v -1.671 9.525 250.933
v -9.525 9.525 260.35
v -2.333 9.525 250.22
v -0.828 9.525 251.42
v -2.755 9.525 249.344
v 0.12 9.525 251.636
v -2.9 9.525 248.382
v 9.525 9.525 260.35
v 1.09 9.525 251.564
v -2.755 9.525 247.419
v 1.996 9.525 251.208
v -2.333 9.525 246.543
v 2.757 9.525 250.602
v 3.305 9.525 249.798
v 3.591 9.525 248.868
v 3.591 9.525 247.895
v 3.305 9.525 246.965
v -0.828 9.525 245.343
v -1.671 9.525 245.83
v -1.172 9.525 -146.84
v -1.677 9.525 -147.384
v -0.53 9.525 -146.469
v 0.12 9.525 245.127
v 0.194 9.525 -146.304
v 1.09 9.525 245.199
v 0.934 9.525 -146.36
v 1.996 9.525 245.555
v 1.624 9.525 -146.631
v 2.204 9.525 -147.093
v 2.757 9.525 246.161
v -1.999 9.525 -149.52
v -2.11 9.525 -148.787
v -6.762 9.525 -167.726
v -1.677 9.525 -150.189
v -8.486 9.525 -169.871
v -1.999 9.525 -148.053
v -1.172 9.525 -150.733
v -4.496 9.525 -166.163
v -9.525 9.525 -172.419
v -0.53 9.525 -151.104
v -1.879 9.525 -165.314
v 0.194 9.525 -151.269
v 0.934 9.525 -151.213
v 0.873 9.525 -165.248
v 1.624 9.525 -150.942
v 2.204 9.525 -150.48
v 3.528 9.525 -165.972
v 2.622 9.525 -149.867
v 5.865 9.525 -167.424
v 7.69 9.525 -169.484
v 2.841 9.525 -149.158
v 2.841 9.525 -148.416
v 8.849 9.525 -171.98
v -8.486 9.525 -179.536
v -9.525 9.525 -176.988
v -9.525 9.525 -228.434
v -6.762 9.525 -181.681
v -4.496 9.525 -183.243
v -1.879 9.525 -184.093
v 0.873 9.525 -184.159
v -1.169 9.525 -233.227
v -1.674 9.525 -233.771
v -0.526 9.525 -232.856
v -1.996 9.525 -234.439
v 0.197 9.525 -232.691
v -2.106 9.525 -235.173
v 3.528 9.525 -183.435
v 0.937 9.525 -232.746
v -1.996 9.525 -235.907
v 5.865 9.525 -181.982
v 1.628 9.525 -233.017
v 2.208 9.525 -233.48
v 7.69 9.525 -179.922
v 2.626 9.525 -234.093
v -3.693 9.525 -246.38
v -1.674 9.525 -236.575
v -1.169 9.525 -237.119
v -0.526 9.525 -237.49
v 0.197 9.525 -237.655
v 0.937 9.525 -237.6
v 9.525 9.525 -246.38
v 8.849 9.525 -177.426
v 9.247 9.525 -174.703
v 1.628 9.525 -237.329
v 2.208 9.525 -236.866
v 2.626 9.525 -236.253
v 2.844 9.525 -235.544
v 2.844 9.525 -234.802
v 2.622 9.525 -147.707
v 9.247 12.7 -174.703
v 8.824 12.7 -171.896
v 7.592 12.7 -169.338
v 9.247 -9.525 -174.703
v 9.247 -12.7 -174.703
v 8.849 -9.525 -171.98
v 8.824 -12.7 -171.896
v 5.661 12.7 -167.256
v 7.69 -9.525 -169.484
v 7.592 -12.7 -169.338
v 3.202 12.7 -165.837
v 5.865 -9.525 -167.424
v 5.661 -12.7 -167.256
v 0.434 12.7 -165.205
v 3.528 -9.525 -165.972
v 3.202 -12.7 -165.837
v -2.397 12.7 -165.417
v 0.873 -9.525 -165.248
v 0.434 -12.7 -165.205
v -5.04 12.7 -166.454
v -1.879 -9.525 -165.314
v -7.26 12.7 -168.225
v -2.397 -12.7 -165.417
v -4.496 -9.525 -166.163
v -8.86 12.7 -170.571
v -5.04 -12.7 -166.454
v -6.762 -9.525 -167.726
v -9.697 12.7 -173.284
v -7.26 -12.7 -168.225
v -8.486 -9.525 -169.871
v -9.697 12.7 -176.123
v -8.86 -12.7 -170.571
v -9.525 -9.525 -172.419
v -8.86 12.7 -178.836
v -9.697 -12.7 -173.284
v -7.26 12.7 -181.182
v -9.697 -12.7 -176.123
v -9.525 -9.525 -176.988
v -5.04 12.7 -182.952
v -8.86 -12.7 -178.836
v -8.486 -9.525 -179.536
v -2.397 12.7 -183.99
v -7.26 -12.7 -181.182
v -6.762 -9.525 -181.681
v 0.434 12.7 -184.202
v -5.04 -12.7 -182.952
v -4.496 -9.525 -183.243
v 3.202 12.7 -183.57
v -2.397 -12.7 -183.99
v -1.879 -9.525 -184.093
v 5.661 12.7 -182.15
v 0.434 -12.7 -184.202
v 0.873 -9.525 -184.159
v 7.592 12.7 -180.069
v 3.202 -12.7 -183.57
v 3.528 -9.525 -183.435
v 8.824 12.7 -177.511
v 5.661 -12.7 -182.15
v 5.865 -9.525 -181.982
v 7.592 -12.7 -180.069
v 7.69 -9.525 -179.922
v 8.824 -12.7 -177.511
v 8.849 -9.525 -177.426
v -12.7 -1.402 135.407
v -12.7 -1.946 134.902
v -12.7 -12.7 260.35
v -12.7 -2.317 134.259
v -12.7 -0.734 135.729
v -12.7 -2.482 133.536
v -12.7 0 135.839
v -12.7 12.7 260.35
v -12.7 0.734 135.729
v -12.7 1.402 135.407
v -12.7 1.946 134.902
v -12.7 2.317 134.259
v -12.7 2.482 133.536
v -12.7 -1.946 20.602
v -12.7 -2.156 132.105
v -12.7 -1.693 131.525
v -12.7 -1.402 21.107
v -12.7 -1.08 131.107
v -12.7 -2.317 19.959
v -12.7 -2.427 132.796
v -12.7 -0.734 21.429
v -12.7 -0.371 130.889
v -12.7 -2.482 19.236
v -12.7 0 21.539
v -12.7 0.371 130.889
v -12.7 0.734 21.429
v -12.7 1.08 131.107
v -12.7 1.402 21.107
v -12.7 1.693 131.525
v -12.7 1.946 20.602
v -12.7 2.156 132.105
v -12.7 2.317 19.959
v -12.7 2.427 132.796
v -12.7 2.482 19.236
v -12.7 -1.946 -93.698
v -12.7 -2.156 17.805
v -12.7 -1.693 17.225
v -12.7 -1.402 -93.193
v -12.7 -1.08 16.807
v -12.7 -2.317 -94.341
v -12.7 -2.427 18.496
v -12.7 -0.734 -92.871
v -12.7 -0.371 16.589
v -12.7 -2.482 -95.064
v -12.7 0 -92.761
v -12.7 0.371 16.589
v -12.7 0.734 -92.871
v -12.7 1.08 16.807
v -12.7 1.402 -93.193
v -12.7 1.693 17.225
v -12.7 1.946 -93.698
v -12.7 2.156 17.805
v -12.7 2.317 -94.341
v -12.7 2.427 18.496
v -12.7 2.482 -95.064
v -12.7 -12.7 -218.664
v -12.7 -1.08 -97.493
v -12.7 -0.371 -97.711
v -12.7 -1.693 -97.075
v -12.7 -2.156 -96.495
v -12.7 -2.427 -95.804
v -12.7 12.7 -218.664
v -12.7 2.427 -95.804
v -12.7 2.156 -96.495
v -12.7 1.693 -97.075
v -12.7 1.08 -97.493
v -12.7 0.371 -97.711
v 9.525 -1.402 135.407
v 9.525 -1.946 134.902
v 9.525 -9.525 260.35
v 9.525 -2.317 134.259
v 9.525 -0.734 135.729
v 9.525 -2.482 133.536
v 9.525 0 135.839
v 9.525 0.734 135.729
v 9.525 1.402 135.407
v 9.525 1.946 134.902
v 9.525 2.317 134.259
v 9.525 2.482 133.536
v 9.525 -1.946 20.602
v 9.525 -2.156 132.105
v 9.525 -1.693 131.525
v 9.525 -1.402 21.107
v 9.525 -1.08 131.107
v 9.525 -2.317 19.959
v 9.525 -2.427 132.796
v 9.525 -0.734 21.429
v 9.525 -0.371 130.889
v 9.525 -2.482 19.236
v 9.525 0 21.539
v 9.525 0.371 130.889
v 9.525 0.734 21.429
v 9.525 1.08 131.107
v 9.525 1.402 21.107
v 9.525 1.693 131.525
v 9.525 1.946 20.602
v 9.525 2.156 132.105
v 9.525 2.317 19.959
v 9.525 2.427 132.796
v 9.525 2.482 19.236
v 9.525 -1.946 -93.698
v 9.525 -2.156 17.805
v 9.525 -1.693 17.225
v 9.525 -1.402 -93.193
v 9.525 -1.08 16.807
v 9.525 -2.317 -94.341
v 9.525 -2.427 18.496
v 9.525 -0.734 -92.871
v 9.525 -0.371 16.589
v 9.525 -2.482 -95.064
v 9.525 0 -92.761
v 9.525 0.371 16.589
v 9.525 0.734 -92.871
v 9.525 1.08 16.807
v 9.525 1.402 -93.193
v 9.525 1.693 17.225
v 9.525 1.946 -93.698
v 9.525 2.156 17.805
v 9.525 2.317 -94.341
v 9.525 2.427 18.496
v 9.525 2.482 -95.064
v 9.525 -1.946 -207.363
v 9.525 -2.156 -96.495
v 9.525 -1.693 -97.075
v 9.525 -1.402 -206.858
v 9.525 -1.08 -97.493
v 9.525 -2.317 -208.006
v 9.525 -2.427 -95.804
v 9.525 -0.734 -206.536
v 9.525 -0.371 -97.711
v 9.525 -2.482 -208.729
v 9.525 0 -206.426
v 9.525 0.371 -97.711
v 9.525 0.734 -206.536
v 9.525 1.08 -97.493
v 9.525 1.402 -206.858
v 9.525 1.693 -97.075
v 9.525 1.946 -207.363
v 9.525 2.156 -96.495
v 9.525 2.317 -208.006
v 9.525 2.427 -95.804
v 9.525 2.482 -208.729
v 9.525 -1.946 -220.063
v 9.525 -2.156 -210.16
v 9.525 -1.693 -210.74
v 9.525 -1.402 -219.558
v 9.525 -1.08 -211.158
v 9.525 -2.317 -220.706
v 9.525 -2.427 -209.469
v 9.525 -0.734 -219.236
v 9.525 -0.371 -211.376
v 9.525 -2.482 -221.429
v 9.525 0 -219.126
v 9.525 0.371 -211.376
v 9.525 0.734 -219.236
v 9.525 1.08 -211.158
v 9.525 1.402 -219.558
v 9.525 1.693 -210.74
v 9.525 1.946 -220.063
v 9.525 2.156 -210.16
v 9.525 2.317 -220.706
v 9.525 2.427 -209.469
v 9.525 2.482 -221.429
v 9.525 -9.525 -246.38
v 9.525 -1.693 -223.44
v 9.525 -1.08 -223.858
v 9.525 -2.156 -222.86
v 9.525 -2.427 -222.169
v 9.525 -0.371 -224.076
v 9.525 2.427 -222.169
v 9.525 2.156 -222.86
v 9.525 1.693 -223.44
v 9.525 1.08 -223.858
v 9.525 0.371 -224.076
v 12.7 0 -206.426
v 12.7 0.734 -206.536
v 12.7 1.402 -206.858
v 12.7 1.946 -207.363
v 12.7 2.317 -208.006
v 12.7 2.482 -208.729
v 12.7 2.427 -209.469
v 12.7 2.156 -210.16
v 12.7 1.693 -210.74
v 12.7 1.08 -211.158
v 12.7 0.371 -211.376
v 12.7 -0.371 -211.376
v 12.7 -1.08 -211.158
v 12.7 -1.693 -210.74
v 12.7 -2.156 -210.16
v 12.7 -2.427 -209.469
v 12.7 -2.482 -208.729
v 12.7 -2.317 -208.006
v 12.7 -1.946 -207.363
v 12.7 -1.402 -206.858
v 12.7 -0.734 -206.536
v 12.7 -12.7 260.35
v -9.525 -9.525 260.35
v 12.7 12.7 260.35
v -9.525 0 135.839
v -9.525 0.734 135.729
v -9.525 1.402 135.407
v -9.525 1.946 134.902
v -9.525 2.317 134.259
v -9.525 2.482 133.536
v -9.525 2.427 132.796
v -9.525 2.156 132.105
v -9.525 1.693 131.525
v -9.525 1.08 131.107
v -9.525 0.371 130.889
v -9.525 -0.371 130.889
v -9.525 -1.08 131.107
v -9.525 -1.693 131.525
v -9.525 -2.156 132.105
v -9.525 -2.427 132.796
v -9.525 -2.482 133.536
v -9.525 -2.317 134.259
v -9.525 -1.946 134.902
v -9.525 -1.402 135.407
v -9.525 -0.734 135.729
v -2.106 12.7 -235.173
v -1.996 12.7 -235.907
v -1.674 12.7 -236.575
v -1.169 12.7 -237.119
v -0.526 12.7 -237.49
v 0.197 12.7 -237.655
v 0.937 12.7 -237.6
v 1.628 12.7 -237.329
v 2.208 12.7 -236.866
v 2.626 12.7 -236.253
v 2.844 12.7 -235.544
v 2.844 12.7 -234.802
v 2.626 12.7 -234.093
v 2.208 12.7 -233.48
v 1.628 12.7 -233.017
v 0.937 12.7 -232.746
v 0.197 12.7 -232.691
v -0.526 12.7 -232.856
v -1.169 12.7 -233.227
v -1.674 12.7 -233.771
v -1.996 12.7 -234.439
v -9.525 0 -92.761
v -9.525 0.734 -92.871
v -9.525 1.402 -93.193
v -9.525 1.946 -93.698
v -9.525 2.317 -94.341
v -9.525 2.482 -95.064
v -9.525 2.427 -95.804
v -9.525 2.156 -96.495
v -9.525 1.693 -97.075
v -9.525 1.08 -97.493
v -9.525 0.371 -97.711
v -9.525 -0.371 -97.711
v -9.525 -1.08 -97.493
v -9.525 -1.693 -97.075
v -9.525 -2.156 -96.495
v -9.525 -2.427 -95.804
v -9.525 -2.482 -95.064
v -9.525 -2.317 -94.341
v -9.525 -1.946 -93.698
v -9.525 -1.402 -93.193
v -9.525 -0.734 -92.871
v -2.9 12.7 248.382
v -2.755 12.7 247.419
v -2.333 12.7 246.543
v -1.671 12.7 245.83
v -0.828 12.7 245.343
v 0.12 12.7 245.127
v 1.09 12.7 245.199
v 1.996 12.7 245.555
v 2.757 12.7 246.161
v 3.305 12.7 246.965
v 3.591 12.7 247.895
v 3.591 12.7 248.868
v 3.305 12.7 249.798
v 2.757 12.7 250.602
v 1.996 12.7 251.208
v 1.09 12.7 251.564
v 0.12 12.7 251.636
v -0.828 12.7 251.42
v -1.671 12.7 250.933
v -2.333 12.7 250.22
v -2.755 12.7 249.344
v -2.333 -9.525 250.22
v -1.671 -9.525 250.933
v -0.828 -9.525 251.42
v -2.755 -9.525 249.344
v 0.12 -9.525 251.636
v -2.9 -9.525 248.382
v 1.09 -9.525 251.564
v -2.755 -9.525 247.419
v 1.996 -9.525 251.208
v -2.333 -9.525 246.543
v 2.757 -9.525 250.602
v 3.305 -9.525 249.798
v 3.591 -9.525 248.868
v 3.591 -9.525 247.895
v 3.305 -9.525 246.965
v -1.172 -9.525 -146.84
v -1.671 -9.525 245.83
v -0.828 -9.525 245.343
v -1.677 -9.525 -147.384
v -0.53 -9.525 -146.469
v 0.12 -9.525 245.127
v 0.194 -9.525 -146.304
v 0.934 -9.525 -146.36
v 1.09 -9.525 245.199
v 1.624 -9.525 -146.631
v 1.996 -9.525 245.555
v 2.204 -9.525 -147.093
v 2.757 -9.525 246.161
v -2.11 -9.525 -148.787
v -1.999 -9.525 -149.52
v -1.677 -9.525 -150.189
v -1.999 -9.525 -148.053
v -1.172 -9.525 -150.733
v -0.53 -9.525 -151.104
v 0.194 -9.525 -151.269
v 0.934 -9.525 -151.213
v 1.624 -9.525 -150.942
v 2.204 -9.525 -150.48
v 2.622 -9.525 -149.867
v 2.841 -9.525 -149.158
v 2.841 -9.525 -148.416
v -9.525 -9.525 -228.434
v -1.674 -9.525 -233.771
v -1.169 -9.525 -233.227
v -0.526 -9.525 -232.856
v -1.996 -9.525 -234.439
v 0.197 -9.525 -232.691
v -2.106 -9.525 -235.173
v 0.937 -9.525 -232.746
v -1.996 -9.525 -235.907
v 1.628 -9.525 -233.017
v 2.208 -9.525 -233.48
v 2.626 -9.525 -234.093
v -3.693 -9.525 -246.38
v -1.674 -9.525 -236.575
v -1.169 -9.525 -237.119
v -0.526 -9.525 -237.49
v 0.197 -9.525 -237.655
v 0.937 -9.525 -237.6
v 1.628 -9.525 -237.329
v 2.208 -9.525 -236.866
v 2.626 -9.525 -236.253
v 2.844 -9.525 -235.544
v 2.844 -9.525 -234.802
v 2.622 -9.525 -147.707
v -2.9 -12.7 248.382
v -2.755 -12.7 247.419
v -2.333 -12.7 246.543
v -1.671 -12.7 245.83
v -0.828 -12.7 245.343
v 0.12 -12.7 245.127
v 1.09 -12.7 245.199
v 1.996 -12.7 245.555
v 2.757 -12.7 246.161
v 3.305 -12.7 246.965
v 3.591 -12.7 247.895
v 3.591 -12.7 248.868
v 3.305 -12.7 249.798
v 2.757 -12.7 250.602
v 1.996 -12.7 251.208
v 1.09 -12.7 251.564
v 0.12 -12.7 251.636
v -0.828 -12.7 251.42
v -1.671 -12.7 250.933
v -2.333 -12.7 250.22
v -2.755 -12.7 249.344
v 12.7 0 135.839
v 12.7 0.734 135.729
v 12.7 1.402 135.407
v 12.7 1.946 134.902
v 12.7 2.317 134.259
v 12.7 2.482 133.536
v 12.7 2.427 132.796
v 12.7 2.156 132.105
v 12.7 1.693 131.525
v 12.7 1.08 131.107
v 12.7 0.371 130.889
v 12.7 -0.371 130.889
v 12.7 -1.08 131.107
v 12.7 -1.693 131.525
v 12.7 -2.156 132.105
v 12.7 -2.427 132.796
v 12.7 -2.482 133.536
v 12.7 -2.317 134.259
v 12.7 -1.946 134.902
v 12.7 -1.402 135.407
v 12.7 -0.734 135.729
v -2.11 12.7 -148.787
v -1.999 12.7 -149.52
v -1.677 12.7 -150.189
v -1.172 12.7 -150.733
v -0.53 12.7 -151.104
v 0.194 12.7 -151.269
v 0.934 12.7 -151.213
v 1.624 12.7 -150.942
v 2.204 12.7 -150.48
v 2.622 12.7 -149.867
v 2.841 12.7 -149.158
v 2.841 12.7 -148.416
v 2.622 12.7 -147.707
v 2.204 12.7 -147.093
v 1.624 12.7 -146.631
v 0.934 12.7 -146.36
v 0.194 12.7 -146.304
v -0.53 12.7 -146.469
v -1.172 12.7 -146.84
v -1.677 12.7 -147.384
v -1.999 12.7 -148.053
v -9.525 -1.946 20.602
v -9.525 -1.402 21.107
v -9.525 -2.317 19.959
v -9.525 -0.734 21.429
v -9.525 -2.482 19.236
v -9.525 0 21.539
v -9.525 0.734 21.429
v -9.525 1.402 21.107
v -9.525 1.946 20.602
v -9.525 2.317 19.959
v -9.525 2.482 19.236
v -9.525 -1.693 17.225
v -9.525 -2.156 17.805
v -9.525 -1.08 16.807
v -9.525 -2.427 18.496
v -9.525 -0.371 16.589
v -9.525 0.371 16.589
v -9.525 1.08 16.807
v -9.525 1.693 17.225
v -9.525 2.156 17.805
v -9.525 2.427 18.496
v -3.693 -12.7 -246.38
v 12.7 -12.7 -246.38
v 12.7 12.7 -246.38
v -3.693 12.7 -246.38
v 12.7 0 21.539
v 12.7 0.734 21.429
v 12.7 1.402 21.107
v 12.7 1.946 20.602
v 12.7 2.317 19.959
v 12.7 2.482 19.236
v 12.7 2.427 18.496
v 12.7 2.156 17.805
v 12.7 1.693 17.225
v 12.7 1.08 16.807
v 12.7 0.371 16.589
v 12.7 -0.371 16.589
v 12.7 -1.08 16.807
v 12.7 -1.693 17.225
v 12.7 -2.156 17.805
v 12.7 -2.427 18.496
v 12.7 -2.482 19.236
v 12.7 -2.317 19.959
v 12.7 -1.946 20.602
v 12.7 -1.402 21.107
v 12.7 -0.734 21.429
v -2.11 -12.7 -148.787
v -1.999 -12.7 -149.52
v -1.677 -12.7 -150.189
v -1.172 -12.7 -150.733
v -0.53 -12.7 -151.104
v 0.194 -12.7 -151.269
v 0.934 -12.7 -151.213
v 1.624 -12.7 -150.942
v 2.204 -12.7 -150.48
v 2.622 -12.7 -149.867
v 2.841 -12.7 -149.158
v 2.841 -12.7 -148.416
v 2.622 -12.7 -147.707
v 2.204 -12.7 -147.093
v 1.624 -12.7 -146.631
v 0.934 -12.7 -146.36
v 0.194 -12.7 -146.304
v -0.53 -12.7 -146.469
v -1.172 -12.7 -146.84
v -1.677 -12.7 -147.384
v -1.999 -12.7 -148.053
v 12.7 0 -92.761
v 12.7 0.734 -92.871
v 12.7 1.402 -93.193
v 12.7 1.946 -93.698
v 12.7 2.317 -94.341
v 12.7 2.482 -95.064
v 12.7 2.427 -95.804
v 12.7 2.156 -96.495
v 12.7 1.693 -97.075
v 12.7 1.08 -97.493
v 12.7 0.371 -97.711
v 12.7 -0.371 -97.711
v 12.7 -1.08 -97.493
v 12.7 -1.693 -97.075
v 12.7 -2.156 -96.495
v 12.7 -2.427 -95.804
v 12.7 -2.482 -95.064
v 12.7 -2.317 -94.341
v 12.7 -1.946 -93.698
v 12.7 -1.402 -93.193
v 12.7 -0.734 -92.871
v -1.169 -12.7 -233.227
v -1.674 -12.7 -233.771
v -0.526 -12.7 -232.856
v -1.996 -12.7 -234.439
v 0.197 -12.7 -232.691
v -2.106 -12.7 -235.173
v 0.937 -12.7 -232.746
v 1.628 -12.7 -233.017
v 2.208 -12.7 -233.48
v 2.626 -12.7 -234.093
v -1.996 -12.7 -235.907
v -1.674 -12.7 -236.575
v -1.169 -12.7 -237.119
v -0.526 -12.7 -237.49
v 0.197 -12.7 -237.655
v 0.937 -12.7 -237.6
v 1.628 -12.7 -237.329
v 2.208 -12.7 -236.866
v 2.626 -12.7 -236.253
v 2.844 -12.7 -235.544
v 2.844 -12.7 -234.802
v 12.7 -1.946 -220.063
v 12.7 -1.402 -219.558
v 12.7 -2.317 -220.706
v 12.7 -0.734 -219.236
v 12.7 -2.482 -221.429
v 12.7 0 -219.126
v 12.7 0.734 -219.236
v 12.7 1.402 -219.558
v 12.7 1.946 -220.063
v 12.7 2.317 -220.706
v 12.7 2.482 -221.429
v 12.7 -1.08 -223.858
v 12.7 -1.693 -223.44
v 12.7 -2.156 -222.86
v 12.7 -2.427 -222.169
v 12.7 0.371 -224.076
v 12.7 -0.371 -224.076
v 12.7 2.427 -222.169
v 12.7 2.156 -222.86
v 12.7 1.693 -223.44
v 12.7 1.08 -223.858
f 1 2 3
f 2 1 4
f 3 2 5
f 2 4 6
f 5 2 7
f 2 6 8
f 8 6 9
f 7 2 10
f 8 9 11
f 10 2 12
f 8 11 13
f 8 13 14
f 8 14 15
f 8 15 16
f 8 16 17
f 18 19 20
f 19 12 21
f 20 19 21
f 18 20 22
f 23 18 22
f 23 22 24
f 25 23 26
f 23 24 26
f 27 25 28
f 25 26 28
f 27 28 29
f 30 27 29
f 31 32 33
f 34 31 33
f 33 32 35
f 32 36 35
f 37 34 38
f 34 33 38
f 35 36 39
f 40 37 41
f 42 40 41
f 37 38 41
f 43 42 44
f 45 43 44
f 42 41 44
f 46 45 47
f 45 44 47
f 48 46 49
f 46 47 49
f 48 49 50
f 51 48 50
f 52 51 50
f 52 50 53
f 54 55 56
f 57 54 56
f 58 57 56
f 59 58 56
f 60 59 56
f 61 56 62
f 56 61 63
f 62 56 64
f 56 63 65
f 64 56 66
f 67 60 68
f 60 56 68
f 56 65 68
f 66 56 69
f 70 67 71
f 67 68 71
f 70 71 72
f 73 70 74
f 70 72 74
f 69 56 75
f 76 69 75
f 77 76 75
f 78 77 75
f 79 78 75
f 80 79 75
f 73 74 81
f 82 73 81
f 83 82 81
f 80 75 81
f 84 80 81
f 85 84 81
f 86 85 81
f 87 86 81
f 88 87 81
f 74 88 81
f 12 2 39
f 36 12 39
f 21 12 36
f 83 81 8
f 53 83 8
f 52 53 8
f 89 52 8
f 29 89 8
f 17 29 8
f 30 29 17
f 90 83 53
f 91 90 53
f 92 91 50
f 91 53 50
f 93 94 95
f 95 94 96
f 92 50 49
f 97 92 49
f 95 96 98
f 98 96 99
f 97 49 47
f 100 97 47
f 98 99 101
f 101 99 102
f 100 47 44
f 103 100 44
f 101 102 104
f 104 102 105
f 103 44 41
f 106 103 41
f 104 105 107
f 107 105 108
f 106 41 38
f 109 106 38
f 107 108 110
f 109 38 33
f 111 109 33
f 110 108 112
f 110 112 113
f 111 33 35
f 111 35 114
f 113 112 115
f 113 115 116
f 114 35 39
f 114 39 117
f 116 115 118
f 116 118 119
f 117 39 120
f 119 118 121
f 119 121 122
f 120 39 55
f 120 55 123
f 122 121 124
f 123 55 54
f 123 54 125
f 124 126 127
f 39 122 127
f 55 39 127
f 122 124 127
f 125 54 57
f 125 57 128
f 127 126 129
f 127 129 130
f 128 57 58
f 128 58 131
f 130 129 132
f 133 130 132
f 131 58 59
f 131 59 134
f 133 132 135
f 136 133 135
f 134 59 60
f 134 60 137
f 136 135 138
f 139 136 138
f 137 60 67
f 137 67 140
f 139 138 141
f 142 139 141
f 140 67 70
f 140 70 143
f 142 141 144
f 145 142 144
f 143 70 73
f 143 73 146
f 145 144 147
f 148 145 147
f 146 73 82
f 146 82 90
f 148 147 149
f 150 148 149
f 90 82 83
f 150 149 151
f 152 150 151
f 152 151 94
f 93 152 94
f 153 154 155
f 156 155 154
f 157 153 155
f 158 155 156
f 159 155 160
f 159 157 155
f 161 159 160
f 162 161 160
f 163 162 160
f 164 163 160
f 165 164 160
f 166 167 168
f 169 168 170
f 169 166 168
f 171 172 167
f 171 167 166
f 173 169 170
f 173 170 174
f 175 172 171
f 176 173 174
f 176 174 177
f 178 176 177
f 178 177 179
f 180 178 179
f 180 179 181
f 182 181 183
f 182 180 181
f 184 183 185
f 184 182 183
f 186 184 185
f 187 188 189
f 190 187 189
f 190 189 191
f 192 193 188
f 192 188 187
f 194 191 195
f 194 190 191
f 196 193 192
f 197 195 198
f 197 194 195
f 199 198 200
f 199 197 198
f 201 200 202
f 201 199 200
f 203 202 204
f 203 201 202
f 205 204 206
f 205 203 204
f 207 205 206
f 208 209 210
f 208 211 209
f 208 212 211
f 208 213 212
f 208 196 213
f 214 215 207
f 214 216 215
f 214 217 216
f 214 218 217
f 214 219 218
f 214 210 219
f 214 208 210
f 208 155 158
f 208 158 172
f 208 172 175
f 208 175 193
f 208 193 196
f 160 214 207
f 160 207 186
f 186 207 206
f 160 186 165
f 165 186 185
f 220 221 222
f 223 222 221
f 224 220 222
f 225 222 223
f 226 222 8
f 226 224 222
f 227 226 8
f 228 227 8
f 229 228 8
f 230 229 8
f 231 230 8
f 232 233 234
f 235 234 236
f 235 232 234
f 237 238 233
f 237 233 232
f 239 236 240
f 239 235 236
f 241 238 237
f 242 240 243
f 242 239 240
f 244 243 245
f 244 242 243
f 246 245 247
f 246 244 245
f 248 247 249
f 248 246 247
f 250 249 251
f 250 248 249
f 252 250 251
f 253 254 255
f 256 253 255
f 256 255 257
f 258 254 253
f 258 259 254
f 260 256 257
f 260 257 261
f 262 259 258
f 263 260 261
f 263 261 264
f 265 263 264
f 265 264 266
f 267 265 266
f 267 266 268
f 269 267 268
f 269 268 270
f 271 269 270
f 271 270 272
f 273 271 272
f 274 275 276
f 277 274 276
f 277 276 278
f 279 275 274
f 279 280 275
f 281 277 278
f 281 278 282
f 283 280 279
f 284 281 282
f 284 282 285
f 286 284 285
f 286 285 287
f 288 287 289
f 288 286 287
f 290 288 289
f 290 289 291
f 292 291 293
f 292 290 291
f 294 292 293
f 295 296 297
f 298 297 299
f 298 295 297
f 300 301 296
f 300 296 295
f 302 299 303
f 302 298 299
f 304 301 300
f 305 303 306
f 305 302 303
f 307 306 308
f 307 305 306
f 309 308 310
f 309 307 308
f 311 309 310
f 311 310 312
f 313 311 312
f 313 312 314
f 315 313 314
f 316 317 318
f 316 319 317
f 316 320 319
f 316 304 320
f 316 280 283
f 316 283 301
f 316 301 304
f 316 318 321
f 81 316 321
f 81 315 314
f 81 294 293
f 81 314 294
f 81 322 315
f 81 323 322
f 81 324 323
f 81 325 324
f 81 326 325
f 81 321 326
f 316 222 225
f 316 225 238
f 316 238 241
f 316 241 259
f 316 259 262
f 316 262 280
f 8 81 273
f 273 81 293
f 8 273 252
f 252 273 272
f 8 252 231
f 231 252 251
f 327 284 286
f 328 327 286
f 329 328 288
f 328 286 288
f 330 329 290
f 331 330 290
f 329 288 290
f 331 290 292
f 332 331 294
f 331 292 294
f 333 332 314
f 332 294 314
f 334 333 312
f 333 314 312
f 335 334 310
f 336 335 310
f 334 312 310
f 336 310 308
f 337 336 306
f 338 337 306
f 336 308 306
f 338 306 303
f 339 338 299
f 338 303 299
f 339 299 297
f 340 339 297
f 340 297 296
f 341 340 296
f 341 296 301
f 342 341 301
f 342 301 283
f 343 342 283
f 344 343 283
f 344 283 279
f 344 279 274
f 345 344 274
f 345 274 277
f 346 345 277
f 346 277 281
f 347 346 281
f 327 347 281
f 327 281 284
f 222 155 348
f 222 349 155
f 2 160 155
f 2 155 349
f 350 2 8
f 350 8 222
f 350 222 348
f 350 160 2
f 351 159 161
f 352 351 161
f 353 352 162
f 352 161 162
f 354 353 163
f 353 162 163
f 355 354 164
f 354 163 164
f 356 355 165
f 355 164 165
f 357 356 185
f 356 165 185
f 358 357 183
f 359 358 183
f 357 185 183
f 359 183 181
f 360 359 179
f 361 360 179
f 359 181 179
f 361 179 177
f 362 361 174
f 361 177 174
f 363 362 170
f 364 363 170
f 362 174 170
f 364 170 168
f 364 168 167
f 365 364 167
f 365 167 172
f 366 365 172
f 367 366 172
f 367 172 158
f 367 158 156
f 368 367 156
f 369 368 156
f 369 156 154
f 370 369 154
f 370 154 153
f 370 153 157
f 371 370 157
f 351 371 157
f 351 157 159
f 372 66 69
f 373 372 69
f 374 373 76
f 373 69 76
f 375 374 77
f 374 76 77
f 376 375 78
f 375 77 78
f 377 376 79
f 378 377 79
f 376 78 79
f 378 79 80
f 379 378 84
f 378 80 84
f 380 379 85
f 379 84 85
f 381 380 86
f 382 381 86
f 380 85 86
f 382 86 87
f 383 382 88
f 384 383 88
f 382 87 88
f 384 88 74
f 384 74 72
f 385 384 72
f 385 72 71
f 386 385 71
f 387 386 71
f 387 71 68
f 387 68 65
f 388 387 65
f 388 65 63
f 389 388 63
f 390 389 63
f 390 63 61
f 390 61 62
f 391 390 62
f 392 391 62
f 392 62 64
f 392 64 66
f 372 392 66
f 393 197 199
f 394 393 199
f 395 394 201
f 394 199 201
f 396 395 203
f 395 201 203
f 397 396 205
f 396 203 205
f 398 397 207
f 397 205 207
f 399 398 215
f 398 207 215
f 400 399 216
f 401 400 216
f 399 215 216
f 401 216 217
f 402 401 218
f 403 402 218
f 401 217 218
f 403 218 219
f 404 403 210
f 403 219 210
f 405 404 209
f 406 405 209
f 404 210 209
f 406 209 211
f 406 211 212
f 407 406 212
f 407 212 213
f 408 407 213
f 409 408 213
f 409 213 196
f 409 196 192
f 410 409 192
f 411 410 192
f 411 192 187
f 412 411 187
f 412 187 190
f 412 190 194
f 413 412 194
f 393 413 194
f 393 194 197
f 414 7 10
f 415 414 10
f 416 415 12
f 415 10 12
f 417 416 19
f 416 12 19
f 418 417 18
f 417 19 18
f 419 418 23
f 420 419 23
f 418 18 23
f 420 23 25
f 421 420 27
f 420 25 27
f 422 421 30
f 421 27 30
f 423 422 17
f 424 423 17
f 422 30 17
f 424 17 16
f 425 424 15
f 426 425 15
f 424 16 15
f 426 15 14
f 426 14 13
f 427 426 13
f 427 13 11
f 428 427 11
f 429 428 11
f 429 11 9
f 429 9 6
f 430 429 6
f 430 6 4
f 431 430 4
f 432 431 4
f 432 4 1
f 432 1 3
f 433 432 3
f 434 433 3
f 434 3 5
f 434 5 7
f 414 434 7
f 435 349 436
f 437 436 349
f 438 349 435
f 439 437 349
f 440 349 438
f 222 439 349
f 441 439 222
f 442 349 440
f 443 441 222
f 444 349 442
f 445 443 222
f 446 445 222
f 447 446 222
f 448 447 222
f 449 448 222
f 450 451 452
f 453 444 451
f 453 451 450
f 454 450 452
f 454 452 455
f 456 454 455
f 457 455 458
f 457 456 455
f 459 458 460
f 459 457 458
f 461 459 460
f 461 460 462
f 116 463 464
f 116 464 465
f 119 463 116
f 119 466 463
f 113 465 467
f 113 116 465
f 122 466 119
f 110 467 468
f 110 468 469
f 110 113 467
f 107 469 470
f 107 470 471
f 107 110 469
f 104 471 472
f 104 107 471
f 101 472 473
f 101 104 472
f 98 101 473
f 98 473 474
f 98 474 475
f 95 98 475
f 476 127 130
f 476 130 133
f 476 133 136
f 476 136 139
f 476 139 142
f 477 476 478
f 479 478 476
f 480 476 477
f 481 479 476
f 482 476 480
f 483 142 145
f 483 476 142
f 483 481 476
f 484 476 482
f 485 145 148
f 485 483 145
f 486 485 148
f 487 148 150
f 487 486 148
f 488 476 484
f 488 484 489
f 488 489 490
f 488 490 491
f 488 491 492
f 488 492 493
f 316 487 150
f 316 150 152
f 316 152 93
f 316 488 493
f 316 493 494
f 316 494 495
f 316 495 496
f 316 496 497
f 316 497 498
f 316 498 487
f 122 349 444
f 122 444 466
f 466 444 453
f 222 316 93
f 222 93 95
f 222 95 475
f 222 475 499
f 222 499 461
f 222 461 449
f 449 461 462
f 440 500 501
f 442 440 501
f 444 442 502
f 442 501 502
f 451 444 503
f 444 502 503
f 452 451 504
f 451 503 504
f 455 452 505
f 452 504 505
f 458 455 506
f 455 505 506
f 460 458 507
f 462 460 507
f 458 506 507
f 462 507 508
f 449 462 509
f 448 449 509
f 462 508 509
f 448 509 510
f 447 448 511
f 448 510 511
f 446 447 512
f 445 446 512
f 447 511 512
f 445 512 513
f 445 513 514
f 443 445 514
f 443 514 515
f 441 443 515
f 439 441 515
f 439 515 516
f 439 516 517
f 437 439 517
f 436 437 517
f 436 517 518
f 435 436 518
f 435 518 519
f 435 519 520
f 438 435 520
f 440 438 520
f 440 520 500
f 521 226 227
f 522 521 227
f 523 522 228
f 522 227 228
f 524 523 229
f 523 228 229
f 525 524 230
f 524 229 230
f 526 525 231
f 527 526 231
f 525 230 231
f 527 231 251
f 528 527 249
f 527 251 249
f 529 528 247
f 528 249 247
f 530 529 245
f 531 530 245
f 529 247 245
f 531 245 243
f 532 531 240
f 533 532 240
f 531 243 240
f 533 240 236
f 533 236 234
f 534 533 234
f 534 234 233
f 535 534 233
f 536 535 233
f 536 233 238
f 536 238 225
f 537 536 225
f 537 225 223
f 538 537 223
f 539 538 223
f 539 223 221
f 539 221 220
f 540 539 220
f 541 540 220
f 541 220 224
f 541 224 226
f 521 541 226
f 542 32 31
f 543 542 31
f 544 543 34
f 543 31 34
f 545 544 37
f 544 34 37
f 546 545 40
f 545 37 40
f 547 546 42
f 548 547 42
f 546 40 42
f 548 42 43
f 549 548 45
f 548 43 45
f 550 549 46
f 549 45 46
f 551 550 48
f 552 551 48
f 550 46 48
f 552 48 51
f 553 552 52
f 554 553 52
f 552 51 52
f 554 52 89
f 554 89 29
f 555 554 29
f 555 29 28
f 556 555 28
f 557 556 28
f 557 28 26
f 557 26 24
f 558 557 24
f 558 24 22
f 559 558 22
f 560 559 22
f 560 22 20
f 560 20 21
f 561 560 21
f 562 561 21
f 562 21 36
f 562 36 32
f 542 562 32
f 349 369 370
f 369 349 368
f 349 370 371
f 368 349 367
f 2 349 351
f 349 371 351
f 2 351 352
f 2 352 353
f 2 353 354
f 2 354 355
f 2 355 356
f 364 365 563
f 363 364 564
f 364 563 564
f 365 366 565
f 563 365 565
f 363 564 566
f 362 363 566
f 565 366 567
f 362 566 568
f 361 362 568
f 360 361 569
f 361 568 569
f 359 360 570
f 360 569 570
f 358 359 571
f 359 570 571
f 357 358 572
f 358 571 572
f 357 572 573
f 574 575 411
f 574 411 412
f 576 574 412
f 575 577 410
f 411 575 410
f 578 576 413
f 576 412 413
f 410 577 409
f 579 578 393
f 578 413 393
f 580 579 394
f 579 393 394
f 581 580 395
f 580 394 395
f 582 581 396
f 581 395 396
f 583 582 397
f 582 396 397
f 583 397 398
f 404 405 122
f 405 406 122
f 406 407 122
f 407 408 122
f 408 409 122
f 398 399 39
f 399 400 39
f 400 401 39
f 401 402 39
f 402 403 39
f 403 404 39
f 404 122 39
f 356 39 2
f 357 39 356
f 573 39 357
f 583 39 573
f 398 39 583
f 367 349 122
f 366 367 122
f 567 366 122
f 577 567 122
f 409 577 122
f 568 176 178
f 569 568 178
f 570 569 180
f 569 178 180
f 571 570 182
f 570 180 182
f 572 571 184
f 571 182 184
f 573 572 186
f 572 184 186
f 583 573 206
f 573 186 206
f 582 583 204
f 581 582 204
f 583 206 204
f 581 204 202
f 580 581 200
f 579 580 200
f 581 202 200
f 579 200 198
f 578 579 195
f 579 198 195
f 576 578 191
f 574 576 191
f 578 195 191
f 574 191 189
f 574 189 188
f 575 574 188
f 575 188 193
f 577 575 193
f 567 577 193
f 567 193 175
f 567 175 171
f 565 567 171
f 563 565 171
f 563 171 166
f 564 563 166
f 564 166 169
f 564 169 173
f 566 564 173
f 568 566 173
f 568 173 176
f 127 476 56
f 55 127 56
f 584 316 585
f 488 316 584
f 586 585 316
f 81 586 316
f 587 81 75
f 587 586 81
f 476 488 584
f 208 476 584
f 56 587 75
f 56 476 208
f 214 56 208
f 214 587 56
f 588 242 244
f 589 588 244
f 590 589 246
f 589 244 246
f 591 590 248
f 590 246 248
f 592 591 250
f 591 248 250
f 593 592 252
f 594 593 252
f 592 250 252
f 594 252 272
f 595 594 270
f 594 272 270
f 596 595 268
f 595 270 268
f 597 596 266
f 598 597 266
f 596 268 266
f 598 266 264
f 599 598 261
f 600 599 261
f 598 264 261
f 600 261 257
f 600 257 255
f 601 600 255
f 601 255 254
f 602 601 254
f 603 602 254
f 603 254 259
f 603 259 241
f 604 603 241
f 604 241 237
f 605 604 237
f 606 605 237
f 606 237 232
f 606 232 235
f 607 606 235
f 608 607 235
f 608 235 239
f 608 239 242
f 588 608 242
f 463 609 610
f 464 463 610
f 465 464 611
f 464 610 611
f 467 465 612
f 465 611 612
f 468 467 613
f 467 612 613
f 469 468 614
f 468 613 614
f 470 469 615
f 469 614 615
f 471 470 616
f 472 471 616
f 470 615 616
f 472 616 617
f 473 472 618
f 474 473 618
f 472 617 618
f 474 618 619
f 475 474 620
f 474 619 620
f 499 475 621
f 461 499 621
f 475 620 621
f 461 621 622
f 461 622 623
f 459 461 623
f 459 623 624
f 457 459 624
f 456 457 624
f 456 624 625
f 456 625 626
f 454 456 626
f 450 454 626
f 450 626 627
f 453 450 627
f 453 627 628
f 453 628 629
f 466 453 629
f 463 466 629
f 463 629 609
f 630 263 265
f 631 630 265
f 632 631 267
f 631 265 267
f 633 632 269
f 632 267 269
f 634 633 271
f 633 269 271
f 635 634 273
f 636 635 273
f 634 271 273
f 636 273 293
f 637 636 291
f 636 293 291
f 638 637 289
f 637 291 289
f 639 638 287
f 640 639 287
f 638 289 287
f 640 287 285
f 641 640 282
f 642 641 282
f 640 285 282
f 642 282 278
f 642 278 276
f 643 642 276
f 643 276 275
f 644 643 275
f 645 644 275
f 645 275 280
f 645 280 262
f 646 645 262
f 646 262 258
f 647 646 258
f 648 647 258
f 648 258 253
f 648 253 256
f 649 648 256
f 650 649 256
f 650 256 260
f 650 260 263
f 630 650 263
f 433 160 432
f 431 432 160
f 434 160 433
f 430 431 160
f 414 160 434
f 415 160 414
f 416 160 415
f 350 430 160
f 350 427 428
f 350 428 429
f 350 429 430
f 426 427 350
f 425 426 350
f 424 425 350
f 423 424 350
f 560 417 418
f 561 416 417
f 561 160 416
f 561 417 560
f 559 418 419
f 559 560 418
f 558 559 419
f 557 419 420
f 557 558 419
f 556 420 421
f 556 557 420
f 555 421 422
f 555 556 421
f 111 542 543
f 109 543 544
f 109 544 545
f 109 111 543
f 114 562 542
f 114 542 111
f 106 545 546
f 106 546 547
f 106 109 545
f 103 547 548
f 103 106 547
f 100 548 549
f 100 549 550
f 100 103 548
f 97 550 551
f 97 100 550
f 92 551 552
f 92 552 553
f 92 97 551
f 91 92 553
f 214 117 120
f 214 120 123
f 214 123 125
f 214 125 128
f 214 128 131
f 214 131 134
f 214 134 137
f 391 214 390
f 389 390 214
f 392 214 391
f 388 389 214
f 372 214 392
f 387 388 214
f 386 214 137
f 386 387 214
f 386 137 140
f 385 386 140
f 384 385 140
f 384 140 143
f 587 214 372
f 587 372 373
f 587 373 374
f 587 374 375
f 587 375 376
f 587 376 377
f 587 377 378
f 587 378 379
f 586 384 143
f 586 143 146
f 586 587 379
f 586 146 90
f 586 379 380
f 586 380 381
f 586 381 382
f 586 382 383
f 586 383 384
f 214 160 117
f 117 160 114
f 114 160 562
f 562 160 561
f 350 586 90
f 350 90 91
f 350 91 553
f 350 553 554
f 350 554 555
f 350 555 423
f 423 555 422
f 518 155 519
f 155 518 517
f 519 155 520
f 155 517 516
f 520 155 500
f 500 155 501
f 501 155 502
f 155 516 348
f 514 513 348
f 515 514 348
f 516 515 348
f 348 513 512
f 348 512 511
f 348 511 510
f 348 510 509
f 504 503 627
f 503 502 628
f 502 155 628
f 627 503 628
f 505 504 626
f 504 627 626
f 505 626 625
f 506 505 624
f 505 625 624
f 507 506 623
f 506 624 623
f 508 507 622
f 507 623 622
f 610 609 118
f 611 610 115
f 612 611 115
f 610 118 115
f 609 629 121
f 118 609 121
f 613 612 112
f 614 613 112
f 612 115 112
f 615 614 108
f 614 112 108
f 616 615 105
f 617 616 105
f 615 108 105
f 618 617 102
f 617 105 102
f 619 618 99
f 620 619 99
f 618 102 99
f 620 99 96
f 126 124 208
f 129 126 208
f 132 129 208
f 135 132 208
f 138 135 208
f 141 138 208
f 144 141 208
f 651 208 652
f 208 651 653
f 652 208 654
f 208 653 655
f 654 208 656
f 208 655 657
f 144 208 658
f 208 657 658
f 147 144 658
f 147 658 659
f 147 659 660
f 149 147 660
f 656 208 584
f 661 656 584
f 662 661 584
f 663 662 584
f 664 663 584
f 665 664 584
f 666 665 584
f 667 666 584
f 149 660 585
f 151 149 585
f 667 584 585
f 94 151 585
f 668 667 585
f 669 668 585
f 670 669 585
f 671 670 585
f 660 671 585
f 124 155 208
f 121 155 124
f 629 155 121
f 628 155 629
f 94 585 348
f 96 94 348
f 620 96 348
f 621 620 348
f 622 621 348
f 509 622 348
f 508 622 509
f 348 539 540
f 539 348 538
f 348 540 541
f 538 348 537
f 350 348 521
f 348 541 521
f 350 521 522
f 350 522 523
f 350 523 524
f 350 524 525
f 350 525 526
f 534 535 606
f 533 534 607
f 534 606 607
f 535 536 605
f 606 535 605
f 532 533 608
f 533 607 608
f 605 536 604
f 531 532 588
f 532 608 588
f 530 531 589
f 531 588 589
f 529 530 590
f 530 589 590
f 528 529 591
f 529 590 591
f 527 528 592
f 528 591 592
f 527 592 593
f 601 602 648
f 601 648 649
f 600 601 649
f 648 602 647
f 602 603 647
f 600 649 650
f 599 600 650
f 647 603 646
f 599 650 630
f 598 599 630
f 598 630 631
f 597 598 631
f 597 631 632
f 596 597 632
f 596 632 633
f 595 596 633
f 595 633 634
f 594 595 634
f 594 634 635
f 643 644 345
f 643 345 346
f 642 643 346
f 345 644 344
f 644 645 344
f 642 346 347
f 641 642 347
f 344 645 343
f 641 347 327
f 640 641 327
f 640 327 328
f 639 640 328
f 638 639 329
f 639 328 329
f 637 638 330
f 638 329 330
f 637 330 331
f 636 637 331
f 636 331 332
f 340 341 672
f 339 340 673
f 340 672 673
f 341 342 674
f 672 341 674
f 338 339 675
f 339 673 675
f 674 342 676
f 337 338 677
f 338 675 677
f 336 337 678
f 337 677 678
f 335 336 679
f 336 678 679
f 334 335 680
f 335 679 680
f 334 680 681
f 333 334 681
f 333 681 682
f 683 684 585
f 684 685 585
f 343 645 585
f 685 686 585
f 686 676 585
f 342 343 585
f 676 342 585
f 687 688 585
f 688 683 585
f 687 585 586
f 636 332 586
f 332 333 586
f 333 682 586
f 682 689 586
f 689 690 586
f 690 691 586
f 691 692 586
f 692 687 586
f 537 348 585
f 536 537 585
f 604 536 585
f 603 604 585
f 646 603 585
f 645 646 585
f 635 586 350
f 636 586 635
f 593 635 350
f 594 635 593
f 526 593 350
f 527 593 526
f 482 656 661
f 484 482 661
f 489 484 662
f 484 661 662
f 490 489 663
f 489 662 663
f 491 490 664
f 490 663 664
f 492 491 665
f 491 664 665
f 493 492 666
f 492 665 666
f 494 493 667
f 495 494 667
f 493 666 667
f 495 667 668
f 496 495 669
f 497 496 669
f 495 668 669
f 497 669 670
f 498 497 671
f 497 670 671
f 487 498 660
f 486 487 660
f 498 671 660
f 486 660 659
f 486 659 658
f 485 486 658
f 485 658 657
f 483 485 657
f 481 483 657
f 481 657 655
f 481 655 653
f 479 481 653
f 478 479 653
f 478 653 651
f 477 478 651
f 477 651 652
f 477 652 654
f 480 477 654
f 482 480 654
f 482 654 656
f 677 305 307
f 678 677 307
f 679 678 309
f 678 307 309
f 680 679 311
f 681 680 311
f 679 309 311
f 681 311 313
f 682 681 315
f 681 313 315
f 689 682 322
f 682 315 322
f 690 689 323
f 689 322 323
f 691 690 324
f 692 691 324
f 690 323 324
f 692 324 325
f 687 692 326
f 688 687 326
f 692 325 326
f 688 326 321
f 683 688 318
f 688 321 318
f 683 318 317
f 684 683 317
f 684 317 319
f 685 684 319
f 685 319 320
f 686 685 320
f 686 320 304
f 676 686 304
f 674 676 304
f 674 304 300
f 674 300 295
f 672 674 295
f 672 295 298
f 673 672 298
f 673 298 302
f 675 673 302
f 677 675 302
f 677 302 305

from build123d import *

# Parameters (mm, degrees)
BOSS_EXTRUDE1_DEPTH        = 260.35
BOSS_EXTRUDE1_DEPTH_BACK   = 260.35
SKETCH3_W                  = 25.4
SKETCH3_H                  = 25.4
SKETCH3_W_2                = 19.05
SKETCH3_H_2                = 19.05
CUT_EXTRUDE1_DEPTH         = 25.4
SKETCH5_R                  = 9.525
CUT_EXTRUDE2_DEPTH         = 262.894200967
F_10_CLEARANCE_HOLE2_D     = 4.9784
F_1_4_CLEARANCE_HOLE2_D    = 6.5278
F_10_CLEARANCE_HOLE3_D     = 4.9784
F_10_CLEARANCE_HOLE3_DEPTH = 5.08
F_10_CLEARANCE_HOLE3_TIP   = 1.495662253
F_10_CLEARANCE_HOLE4_D     = 4.9784


with BuildPart() as part:
    # Sketch3 → Boss-Extrude1 (new, two sides: drawn at the far end of the back side and taken through both)
    with BuildSketch(Plane.XY.offset(-BOSS_EXTRUDE1_DEPTH_BACK)):
        Rectangle(SKETCH3_W, SKETCH3_H)
        Rectangle(SKETCH3_W_2, SKETCH3_H_2, mode=Mode.SUBTRACT)
    extrude(amount=BOSS_EXTRUDE1_DEPTH + BOSS_EXTRUDE1_DEPTH_BACK)

    # Sketch4 → Cut-Extrude1 (cut)
    with BuildSketch(Plane(origin=(0, 12.7, 0), x_dir=(1, 0, 0), z_dir=(0, 1, 0))):
        Polygon((-12.7, 218.66352), (-12.7, 260.35), (12.7, 260.35), (12.7, 246.38), (-3.69316, 246.38), align=None)
    extrude(amount=-CUT_EXTRUDE1_DEPTH, mode=Mode.SUBTRACT)

    # Sketch5 → Cut-Extrude2 (cut, through all)
    with BuildSketch(Plane.XZ.offset(12.7)):
        with Locations((-0.277971341, -174.703317269)):
            Circle(SKETCH5_R)
    extrude(amount=-CUT_EXTRUDE2_DEPTH, mode=Mode.SUBTRACT)

    # #10 Clearance Hole2 (through all)
    with Locations(Plane(origin=(0, 12.7, 0), x_dir=(1, 0, 0), z_dir=(0, 1, 0))):
        with Locations((0.379684713, 148.786549658), (0.38309512, 235.173069731)):
            Hole(F_10_CLEARANCE_HOLE2_D / 2)

    # 1/4 Clearance Hole2 (through all)
    with Locations(Plane(origin=(0, 12.7, 0), x_dir=(1, 0, 0), z_dir=(0, 1, 0))):
        with Locations((0.364005636, -248.381514442)):
            Hole(F_1_4_CLEARANCE_HOLE2_D / 2)

    # #10 Clearance Hole3
    with Locations(Plane(origin=(12.7, 0, 0), x_dir=(0, 0, -1), z_dir=(1, 0, 0))):
        with Locations((221.615, 0), (208.915, 0)):
            Hole(F_10_CLEARANCE_HOLE3_D / 2, depth=F_10_CLEARANCE_HOLE3_DEPTH)
            with Locations((0, 0, -(F_10_CLEARANCE_HOLE3_DEPTH + F_10_CLEARANCE_HOLE3_TIP / 2))):  # 118° drill point
                Cone(0, F_10_CLEARANCE_HOLE3_D / 2, F_10_CLEARANCE_HOLE3_TIP, mode=Mode.SUBTRACT)

    # #10 Clearance Hole4 (through all)
    with Locations(Plane(origin=(12.7, 0, 0), x_dir=(0, 0, -1), z_dir=(1, 0, 0))):
        with Locations((-133.35, 0), (-19.05, 0), (95.25, 0)):
            Hole(F_10_CLEARANCE_HOLE4_D / 2)


solid = part.part
